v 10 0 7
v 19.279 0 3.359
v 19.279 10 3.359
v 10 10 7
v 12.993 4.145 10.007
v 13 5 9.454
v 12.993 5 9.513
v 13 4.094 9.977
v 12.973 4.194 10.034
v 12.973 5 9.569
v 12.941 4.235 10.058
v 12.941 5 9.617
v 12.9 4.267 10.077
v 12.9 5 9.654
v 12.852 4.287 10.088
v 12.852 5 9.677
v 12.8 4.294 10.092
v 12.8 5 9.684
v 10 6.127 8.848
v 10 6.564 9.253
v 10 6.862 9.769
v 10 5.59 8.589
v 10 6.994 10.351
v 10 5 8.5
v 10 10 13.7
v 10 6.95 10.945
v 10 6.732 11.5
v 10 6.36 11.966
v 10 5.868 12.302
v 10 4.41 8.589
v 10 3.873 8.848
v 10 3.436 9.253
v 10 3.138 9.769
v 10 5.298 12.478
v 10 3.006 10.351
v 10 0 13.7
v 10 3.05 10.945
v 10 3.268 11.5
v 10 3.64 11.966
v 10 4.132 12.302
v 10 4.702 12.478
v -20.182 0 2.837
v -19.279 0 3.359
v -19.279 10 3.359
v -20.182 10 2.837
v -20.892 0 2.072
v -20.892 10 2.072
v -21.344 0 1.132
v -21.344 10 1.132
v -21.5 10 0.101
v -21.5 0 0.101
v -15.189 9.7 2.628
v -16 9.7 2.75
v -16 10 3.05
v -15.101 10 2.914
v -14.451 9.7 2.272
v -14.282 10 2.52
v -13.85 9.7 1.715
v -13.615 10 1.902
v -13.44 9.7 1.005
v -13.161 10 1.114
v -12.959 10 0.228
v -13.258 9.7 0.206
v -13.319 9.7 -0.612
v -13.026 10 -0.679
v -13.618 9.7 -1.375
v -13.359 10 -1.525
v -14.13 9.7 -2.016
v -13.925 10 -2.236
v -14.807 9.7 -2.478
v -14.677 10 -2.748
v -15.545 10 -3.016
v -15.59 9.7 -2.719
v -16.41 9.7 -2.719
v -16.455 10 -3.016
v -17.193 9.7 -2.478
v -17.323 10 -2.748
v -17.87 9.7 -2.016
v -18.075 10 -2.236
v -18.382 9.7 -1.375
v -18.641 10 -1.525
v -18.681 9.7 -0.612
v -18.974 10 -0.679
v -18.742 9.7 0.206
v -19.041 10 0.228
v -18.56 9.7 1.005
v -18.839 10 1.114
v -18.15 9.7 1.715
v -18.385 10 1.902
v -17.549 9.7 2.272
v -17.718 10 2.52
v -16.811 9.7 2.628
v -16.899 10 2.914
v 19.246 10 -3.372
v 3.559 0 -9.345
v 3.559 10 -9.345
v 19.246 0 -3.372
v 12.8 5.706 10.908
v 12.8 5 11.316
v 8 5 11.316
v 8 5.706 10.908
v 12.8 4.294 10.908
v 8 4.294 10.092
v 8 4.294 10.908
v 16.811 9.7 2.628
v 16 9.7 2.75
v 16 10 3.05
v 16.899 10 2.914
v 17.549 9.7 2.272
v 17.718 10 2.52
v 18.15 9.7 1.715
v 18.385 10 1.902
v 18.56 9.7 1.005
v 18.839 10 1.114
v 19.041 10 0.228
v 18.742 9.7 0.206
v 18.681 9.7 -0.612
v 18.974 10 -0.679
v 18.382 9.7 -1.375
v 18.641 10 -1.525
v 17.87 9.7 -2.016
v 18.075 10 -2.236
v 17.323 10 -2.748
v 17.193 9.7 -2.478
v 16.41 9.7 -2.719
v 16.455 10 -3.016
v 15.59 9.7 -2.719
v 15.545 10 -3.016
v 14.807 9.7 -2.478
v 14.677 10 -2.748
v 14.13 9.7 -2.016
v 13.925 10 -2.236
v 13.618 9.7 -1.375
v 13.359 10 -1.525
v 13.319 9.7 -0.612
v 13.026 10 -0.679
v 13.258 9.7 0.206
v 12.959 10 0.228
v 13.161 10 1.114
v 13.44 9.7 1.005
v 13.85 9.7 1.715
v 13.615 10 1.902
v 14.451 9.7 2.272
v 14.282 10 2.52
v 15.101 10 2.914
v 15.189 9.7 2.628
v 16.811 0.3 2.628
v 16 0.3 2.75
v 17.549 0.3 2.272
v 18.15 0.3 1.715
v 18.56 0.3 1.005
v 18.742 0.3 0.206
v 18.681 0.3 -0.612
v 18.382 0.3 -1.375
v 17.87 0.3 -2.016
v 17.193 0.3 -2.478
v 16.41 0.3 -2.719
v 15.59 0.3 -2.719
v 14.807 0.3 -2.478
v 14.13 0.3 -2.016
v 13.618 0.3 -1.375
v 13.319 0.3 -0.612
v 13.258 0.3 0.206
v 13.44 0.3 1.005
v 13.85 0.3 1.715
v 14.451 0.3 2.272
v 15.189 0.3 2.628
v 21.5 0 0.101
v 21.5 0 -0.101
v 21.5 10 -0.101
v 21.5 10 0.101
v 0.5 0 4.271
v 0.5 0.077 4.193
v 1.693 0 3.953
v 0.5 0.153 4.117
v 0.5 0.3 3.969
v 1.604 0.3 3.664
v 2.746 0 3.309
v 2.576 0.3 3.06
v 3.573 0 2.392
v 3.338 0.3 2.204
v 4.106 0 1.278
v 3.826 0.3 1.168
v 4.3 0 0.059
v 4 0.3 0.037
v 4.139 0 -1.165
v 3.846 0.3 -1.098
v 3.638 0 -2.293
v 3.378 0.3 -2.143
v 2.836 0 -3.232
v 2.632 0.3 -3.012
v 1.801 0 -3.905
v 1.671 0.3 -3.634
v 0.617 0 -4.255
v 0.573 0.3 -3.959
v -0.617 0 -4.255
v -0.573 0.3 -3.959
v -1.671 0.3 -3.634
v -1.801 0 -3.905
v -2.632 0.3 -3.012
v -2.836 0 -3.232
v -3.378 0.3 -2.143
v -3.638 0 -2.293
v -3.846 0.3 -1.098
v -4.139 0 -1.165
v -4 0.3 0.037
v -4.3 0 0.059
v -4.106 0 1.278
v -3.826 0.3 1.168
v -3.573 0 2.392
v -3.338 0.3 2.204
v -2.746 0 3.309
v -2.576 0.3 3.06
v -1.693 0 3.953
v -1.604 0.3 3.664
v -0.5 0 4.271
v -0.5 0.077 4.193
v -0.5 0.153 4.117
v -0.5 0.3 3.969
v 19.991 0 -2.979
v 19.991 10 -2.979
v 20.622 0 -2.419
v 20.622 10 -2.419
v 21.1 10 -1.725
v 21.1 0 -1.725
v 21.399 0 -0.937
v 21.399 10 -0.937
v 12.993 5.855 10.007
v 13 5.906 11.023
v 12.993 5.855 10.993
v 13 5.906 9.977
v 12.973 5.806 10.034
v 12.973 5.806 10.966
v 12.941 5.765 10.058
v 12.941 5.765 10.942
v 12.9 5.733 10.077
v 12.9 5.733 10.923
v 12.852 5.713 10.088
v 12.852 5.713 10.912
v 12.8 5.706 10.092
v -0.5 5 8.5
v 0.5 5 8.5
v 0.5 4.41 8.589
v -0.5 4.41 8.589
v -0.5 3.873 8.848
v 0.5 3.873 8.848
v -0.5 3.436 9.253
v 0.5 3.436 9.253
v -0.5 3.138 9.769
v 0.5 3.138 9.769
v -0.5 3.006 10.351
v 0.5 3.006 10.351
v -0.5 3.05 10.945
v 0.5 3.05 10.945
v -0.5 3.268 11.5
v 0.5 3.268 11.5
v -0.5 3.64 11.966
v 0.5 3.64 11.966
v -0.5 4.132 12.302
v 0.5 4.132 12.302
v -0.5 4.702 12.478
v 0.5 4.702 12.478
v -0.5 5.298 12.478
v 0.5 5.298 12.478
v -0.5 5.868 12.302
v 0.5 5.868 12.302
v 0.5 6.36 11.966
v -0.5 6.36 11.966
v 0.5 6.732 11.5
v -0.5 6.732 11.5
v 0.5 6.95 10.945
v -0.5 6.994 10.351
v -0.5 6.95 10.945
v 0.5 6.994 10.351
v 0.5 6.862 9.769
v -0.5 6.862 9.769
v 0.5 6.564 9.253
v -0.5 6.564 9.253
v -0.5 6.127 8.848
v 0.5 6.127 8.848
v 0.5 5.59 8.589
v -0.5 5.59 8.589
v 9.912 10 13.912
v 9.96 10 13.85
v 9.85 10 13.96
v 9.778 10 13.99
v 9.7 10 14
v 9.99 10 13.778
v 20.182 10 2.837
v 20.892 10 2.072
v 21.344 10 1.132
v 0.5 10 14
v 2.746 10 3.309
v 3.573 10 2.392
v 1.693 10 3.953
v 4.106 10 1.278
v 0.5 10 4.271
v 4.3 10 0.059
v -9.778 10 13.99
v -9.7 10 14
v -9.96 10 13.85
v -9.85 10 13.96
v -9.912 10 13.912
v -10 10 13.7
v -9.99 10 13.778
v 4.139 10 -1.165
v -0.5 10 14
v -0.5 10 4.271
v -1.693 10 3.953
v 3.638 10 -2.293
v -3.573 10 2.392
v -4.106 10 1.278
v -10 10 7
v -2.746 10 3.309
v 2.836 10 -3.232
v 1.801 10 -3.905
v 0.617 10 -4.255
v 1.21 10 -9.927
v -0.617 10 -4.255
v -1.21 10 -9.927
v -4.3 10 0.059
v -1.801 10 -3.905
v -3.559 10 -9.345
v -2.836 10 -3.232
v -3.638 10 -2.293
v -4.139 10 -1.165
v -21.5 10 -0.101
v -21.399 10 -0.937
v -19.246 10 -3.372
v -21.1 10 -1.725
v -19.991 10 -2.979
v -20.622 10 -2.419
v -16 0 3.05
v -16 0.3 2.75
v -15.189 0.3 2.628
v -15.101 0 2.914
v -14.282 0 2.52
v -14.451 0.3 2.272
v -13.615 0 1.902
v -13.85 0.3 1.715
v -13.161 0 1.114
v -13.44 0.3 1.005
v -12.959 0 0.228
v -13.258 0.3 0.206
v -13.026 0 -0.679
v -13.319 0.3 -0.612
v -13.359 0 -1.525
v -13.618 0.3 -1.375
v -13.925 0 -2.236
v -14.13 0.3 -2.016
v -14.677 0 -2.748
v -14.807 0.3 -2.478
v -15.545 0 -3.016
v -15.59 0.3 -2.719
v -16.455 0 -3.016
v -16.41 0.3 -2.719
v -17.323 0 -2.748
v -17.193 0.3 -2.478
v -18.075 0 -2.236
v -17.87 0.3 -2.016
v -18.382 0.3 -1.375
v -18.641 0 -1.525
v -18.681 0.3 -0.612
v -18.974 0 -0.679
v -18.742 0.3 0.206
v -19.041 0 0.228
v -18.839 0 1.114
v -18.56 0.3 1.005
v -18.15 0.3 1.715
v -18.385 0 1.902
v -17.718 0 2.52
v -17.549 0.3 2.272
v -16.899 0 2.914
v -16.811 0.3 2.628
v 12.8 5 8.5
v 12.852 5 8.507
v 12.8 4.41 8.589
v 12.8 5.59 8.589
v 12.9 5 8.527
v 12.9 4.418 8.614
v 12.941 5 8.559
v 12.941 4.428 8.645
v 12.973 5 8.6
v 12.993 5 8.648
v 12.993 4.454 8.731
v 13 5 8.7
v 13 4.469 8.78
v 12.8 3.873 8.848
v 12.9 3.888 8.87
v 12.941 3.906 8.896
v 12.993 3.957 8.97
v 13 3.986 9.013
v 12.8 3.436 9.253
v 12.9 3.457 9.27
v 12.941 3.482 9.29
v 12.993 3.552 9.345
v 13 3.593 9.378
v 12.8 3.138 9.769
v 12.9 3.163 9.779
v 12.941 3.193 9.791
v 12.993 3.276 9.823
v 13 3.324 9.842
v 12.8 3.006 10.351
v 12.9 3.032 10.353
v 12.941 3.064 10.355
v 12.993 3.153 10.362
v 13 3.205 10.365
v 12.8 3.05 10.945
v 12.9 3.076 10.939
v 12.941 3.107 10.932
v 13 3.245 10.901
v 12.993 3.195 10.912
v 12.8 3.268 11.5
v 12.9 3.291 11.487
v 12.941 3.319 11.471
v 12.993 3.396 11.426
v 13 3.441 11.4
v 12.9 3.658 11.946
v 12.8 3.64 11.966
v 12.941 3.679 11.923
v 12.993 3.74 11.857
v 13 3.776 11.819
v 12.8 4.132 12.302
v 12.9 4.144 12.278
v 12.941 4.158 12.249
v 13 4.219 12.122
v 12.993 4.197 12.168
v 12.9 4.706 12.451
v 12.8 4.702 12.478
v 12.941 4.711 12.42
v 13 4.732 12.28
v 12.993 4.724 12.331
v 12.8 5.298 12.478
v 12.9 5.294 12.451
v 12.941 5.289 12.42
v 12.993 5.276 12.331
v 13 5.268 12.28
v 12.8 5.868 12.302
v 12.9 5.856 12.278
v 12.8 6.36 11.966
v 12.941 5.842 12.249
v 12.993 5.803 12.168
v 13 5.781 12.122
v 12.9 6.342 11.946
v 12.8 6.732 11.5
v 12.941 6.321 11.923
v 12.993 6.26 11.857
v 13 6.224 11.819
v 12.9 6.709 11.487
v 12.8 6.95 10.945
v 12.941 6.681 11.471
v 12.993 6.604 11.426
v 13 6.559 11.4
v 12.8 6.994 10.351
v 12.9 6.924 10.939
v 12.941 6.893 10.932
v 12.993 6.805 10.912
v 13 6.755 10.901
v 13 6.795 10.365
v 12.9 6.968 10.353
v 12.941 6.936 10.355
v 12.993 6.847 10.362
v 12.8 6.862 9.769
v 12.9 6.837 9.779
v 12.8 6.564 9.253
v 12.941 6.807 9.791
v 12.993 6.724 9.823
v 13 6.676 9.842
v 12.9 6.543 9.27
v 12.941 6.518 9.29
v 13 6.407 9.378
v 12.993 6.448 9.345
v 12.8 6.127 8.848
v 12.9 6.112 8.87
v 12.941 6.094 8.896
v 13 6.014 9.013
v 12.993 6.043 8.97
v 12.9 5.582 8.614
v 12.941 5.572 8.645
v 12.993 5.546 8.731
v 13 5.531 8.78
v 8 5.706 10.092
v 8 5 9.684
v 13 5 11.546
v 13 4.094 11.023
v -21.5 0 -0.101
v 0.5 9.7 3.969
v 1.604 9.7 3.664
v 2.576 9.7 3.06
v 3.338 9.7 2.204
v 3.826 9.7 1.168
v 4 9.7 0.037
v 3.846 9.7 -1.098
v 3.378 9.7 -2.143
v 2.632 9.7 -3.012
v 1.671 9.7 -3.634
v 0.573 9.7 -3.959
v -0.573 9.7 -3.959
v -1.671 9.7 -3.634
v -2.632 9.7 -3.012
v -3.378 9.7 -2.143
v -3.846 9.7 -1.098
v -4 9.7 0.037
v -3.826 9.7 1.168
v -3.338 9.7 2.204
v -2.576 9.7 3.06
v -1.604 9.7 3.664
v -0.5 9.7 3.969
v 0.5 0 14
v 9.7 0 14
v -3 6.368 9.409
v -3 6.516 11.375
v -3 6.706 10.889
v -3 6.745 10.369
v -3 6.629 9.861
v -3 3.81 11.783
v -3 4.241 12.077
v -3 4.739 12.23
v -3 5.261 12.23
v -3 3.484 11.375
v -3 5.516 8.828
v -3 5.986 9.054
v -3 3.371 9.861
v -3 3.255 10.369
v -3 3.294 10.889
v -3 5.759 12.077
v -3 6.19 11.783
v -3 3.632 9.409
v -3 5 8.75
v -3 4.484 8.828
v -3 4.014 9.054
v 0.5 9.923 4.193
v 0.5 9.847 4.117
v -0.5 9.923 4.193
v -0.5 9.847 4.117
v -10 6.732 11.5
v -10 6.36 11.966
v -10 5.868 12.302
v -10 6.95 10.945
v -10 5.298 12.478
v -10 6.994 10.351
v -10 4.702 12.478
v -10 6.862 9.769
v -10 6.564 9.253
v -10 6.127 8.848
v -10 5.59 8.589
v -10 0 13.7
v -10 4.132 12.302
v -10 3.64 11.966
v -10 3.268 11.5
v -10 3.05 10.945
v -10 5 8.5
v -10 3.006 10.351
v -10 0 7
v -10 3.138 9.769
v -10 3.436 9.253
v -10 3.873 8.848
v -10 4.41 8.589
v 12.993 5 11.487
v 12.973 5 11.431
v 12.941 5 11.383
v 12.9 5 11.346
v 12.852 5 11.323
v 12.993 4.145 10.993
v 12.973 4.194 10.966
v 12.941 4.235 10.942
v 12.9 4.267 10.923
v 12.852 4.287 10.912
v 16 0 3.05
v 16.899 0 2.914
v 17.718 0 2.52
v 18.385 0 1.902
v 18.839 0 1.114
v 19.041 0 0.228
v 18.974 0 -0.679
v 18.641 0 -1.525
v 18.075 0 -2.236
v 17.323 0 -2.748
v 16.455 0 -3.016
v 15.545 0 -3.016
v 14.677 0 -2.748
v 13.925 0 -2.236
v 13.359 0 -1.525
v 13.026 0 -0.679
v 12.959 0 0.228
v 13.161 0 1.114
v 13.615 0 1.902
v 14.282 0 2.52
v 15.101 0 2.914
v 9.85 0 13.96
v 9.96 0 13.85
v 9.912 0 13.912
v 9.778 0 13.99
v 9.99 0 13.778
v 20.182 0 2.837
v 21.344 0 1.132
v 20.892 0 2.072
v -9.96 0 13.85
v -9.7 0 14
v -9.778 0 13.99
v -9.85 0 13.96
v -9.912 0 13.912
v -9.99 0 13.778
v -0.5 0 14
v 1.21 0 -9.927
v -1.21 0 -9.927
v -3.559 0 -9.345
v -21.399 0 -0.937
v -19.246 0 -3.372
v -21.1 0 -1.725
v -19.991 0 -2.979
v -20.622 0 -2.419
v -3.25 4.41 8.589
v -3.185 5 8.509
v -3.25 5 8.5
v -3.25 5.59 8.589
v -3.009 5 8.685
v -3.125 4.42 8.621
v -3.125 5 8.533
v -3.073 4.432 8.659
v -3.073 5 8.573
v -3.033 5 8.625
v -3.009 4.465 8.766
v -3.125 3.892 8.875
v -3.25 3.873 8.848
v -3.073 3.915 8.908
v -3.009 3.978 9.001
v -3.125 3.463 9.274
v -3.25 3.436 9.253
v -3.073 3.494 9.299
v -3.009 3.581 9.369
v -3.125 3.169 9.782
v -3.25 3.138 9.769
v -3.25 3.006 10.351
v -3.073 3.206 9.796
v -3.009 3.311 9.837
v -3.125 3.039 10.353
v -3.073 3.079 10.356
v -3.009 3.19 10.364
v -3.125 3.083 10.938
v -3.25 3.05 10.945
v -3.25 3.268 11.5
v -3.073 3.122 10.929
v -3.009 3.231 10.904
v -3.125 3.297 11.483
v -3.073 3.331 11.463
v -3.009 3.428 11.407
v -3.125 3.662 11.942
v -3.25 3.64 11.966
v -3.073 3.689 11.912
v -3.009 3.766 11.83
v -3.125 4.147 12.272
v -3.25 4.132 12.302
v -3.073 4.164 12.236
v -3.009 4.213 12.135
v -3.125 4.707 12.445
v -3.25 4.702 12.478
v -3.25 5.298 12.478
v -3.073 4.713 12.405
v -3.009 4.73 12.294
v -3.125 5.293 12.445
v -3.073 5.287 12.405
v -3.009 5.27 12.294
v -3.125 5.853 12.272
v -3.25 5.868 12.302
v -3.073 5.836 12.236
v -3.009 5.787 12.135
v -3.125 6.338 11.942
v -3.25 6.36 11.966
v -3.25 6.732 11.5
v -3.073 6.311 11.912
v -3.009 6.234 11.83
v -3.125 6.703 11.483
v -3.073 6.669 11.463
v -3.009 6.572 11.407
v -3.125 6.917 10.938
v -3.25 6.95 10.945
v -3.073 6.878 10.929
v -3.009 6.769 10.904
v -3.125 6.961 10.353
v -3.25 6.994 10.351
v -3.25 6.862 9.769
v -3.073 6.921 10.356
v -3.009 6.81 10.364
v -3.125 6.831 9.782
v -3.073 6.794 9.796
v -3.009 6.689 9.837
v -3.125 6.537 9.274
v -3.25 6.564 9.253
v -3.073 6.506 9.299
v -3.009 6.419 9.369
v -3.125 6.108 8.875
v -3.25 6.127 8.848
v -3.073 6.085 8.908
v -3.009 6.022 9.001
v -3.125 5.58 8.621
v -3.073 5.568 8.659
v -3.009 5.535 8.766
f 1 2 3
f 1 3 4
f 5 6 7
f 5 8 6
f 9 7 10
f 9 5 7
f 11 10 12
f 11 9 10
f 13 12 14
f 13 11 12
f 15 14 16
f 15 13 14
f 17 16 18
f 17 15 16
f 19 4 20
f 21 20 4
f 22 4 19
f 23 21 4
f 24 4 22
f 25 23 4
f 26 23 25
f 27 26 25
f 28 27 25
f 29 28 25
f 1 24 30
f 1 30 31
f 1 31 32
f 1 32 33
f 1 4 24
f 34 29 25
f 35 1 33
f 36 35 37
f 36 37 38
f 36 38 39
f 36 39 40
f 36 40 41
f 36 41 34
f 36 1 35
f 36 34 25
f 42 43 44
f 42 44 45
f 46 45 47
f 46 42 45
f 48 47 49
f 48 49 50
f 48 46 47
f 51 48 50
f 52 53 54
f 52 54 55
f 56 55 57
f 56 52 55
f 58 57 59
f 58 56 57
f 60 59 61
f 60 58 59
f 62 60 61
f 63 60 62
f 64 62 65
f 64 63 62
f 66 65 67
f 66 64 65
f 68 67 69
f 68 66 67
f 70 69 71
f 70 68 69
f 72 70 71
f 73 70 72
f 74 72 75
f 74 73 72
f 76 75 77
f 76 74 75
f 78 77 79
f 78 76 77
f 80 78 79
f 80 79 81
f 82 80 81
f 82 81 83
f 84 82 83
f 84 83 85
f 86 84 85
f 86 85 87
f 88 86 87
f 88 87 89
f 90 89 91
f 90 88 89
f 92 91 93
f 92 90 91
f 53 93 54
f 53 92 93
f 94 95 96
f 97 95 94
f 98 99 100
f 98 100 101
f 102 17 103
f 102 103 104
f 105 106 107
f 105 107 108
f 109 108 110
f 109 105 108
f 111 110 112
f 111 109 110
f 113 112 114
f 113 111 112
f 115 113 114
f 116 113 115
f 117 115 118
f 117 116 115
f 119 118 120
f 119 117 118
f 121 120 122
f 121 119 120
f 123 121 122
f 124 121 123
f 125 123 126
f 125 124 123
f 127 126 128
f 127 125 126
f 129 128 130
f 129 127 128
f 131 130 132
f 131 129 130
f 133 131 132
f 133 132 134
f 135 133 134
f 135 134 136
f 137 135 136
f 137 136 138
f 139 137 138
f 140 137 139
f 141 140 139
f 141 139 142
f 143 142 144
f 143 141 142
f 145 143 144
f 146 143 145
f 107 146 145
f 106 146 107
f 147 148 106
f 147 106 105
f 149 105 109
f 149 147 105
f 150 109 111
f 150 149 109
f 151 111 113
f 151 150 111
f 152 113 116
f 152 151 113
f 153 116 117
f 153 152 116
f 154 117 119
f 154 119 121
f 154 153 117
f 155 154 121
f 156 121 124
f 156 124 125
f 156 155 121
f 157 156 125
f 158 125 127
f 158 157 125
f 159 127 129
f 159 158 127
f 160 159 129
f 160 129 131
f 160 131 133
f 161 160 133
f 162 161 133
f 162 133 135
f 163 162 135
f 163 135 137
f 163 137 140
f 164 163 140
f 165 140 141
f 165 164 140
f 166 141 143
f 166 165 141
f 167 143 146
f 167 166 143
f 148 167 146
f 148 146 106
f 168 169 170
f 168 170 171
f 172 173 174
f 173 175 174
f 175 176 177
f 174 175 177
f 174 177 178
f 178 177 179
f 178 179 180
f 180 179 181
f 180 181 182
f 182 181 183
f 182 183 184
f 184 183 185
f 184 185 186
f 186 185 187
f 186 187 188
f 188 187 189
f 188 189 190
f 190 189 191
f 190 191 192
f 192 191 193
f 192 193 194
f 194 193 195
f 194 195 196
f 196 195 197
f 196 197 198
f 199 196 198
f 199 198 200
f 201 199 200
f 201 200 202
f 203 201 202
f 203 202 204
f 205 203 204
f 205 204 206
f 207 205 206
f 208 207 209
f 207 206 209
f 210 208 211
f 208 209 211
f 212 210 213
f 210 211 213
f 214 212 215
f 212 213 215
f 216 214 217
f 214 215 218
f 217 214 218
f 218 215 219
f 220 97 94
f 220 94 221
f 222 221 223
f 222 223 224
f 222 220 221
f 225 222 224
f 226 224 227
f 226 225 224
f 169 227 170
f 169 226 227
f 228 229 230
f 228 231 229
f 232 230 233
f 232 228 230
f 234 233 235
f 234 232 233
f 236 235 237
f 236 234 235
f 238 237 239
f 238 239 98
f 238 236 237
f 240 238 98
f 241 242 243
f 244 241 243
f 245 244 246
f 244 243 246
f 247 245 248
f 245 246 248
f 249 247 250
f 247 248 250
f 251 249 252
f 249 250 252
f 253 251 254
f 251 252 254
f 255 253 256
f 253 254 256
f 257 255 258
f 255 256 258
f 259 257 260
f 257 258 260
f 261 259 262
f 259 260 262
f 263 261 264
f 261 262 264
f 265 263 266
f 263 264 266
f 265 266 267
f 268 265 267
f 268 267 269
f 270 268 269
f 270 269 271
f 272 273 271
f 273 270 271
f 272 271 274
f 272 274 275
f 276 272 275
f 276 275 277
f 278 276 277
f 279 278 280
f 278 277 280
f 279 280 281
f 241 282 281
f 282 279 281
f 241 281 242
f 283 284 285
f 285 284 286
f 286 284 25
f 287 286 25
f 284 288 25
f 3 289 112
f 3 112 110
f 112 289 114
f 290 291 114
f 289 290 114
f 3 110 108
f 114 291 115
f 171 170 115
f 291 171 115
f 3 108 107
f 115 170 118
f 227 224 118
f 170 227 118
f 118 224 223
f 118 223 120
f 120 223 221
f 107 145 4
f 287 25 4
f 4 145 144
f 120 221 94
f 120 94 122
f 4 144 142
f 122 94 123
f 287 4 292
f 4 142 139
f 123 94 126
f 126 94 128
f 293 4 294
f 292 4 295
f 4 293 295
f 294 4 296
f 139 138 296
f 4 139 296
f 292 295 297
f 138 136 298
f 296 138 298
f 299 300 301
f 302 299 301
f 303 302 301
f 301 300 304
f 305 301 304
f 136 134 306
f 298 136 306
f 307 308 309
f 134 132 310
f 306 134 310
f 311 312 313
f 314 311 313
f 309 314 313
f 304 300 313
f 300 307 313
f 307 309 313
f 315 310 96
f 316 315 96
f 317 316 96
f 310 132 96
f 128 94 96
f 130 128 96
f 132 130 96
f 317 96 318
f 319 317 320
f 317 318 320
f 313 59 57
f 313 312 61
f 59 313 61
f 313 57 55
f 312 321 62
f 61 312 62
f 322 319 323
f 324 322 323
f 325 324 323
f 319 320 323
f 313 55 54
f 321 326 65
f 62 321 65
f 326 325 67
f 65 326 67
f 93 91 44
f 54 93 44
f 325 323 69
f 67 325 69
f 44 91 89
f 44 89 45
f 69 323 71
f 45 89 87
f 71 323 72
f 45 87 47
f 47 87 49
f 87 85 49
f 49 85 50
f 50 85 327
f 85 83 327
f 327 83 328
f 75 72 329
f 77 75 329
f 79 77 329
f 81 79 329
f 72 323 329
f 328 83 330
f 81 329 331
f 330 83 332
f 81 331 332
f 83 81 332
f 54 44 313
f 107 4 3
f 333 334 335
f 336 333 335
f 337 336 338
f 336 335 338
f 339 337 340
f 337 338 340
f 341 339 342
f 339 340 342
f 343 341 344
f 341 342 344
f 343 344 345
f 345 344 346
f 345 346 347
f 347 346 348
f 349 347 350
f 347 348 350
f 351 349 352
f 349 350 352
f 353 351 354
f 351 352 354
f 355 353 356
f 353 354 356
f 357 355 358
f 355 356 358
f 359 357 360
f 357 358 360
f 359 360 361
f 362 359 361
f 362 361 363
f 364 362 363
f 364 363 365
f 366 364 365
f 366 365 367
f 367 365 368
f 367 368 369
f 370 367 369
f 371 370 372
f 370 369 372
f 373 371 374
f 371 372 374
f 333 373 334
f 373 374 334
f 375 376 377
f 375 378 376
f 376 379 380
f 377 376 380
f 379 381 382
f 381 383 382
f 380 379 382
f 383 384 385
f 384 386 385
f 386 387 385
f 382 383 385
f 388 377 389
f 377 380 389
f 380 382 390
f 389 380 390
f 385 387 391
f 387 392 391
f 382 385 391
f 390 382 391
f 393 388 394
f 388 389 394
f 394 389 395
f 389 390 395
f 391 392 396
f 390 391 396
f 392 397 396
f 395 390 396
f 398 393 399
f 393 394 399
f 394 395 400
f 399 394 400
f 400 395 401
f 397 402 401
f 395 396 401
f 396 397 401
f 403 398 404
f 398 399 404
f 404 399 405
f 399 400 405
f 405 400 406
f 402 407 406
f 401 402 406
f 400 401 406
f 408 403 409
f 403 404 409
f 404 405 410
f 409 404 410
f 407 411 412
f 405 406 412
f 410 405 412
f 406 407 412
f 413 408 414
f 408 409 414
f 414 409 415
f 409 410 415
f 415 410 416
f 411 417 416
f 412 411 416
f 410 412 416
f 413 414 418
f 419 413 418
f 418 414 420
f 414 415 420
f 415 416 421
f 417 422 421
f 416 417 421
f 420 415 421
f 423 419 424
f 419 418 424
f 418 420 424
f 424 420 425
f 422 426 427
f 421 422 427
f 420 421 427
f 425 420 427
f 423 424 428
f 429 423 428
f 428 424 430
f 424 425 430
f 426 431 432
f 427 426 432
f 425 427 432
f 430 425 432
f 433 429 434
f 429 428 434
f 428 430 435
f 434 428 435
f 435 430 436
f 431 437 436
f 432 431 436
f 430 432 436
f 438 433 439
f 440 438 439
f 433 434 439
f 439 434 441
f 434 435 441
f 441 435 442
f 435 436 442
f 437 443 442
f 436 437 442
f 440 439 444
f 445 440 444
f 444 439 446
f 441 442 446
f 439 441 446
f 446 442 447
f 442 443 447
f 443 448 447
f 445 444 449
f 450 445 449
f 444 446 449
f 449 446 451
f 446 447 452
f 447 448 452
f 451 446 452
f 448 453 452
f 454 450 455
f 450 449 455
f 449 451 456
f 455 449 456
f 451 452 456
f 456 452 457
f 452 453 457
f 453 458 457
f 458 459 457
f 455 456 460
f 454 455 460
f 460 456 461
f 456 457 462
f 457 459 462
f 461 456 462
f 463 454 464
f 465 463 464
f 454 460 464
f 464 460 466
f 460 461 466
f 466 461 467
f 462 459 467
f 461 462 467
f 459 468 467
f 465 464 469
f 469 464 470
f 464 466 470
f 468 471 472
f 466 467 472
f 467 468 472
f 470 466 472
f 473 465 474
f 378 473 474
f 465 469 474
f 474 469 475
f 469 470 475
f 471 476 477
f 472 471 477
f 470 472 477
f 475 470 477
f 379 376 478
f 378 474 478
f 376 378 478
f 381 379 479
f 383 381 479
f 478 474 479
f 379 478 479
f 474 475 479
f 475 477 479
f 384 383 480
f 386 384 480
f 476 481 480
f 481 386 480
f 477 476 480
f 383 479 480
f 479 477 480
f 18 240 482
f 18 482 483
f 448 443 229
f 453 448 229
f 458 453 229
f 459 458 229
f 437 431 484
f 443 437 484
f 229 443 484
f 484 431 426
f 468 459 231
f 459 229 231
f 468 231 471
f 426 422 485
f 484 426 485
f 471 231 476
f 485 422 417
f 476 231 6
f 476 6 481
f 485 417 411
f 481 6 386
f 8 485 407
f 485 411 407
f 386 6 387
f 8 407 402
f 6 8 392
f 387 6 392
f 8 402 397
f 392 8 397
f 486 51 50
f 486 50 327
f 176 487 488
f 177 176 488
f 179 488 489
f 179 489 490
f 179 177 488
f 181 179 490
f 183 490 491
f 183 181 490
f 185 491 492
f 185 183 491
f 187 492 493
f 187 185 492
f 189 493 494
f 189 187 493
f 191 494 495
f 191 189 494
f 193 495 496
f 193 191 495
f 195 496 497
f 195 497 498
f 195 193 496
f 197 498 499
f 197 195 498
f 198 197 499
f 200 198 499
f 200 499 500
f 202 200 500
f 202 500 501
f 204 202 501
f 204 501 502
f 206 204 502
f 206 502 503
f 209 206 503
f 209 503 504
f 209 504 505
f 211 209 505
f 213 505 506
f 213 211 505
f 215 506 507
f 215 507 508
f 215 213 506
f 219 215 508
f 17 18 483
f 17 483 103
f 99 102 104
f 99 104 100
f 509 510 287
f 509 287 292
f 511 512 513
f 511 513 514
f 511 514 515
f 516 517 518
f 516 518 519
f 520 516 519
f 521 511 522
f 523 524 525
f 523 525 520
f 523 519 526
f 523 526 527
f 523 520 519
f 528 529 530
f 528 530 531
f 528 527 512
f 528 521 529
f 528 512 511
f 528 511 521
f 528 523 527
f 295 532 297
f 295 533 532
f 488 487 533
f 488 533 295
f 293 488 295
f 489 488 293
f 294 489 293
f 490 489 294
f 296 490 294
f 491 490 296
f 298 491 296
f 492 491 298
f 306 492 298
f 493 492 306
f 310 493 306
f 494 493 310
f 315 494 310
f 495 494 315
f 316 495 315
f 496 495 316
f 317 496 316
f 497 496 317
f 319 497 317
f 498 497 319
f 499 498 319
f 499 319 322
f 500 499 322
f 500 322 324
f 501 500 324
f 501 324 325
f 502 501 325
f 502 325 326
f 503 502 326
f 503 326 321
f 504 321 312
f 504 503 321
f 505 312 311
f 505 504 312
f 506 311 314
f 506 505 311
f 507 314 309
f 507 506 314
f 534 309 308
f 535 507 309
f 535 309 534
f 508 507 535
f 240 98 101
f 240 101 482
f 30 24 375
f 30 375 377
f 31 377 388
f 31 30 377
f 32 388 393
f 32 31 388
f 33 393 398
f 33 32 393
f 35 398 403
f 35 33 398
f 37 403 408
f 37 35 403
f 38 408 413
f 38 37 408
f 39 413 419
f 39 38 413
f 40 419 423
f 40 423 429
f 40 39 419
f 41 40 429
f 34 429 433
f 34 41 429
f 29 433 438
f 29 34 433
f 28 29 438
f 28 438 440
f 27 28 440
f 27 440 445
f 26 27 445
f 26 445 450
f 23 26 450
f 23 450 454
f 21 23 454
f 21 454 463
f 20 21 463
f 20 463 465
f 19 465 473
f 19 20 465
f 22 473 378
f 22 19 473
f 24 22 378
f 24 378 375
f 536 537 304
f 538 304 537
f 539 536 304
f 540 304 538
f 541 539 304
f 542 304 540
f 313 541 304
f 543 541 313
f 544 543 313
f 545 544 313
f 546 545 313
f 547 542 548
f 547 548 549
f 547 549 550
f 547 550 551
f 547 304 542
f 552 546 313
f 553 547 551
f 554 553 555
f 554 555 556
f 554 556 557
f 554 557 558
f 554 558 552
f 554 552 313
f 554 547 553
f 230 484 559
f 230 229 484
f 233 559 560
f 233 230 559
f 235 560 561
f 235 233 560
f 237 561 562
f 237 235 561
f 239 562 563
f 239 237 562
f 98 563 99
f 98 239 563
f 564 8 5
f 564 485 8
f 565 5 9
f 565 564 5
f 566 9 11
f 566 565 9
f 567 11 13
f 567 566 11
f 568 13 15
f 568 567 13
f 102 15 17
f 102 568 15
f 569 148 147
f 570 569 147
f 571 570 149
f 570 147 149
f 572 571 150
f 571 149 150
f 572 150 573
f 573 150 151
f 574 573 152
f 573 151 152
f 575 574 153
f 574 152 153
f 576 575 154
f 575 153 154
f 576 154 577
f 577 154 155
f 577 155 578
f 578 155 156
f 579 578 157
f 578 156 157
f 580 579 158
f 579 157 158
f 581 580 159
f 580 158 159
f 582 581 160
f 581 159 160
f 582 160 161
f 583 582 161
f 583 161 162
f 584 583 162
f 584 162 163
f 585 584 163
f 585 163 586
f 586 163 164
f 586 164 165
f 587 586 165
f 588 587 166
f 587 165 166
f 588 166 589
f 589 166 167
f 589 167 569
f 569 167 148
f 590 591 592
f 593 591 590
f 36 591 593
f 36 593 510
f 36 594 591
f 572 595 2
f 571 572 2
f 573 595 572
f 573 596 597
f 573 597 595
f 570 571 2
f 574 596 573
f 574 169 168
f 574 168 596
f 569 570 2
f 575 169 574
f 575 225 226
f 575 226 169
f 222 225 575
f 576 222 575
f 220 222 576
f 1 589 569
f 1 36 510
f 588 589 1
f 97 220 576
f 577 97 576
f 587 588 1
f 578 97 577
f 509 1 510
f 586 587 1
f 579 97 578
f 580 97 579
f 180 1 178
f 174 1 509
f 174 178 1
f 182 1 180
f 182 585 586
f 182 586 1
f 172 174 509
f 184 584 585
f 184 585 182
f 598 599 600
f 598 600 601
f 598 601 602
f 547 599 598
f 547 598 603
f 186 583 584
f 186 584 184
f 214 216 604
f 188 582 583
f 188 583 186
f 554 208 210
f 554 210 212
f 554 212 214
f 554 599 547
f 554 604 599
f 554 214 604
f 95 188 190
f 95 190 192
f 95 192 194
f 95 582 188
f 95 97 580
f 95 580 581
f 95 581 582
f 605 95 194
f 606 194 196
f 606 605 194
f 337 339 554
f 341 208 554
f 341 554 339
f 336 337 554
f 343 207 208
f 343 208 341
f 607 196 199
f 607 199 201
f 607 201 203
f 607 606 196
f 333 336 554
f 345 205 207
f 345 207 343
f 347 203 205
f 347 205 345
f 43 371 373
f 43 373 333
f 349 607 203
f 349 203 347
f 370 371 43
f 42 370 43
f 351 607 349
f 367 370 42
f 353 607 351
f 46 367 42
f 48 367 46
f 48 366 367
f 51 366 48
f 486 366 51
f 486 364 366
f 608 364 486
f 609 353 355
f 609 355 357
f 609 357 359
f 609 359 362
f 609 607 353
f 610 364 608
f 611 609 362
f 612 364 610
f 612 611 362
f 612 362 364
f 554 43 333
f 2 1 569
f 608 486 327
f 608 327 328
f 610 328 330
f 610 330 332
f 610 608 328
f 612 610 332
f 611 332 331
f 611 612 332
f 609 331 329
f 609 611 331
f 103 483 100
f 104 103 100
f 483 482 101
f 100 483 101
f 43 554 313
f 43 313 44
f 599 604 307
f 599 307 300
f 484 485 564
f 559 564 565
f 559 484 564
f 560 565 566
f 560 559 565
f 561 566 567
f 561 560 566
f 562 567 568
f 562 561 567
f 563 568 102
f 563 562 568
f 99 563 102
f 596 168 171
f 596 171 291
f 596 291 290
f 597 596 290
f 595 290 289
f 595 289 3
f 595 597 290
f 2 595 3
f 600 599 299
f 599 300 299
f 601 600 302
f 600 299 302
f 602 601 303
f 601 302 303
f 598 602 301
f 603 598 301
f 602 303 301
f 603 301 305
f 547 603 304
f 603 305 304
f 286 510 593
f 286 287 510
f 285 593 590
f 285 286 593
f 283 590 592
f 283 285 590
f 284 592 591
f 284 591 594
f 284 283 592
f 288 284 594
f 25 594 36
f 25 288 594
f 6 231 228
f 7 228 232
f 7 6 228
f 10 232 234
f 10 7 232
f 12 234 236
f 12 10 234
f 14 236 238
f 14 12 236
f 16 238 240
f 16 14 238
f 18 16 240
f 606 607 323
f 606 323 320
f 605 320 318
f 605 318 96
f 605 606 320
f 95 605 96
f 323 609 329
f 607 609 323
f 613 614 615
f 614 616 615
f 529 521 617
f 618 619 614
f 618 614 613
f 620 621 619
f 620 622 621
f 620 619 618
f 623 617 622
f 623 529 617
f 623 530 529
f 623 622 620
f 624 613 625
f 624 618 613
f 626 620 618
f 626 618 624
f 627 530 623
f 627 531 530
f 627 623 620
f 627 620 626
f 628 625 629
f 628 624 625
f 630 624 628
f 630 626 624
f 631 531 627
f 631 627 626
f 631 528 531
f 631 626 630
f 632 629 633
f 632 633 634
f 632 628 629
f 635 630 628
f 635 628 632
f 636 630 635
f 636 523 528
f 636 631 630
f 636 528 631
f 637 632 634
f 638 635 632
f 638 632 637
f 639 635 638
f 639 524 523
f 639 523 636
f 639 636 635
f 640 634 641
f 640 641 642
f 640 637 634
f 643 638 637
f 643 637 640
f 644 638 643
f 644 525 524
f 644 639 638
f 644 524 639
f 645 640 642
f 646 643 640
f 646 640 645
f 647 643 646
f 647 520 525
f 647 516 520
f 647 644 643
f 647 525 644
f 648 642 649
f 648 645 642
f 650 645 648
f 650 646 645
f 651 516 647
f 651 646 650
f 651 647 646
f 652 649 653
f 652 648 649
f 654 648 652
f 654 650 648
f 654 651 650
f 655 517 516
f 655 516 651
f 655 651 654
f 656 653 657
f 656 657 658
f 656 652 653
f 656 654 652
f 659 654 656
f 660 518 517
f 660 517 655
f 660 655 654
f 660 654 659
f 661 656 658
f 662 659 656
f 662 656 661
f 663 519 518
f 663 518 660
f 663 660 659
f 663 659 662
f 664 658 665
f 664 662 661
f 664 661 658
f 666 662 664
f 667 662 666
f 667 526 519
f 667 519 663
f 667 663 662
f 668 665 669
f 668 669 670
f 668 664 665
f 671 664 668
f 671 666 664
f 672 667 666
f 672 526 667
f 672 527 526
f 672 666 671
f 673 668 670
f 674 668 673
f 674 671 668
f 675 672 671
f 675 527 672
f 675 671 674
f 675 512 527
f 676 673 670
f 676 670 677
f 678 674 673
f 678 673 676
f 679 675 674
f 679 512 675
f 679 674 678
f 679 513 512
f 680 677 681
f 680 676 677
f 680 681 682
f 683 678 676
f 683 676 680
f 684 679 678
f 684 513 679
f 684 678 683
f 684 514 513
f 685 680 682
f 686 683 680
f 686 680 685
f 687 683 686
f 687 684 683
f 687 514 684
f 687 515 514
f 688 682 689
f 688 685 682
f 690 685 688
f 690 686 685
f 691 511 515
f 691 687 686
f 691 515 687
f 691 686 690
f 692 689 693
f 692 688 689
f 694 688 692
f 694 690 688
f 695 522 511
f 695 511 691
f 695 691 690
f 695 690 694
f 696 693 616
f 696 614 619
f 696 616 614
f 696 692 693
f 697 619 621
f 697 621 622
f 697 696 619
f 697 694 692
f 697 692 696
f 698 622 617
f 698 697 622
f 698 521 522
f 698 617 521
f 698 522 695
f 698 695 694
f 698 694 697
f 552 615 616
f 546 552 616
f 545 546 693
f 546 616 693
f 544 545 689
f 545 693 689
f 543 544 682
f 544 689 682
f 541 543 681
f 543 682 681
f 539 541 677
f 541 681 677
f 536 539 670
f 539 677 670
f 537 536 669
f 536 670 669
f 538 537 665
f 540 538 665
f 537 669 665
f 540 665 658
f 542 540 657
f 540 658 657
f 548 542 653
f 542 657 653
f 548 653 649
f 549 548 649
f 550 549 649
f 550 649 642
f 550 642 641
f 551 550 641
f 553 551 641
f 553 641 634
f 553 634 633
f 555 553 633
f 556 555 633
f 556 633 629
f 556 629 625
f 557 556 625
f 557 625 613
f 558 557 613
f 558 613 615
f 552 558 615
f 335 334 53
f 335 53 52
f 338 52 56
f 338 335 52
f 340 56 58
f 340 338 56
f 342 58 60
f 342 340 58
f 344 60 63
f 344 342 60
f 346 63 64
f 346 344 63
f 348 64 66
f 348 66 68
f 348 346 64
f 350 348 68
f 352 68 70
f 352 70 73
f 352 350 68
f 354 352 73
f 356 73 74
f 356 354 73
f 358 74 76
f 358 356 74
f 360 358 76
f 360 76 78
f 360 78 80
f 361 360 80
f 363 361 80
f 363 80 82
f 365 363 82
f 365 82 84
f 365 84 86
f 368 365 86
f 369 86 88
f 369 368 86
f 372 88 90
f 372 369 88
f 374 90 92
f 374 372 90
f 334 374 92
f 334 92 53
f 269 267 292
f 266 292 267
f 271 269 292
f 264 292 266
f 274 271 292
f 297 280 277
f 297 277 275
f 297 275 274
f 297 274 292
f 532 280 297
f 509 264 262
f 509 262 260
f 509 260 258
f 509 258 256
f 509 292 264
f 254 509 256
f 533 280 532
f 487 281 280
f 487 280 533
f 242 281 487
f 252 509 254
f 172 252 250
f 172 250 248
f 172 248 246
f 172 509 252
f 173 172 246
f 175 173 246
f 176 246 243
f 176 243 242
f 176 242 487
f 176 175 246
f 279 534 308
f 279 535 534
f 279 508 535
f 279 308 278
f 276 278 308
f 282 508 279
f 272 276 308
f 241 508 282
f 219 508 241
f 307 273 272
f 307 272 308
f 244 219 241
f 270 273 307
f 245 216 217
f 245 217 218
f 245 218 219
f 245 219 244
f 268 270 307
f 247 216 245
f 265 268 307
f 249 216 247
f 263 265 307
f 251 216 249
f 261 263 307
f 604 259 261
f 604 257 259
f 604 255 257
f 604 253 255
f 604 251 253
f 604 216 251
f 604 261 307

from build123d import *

# Parameters (mm, degrees)
SKETCH1_R                     = 2.75
BOSS_EXTRUDE1_DEPTH           = 10
SKETCH3_R                     = 2
CUT_EXTRUDE1_DEPTH            = 32.5
ESBO_O1_R                     = 2
RESSALTO_EXTRUS_O2_DEPTH      = 13
RESSALTO_EXTRUS_O2_DEPTH_BACK = 3
CORTE_EXTRUS_O1_DEPTH         = 5
FILETE1_R                     = 0.2
FILETE2_R                     = 0.25
CHAMFER_1_SIZE                = 0.3
FILLET_1_R                    = 0.3


with BuildPart() as part:
    # Sketch1 → Boss-Extrude1 (new body)
    with BuildSketch(Plane(origin=(0, 0, 0), x_dir=(1, 0, 0), z_dir=(0, 1, 0))):
        with BuildLine():
            Line((21.5, 0.100660355), (21.5, -0.100660355))
            ThreePointArc((21.5, -0.100660355), (20.891804651, -2.072326113), (19.278590937, -3.35875876))
            Line((19.278590937, -3.35875876), (10, -7))
            Line((10, -7), (10, -14))
            Line((10, -14), (0.5, -14))
            Line((0.5, -14), (0.5, -3.968626967))
            ThreePointArc((0.5, -3.968626967), (0, 4), (-0.5, -3.968626967))
            Line((-0.5, -3.968626967), (-0.5, -14))
            Line((-0.5, -14), (-10, -14))
            Line((-10, -14), (-10, -7))
            Line((-10, -7), (-19.278590937, -3.35875876))
            ThreePointArc((-19.278590937, -3.35875876), (-20.891804651, -2.072326113), (-21.5, -0.100660355))
            Line((-21.5, -0.100660355), (-21.5, 0.100660355))
            ThreePointArc((-21.5, 0.100660355), (-20.881804225, 2.086914218), (-19.245597481, 3.371514512))
            Line((-19.245597481, 3.371514512), (-3.558849946, 9.345297591))
            ThreePointArc((-3.558849946, 9.345297591), (0, 10), (3.558849946, 9.345297591))
            Line((3.558849946, 9.345297591), (19.245597481, 3.371514512))
            ThreePointArc((19.245597481, 3.371514512), (20.881804225, 2.086914218), (21.5, 0.100660355))
        make_face()
        with Locations(Location((-16, 0, 0), (0, 0, 270))):  # turned: the seam where the file's is
            Circle(SKETCH1_R, mode=Mode.SUBTRACT)
        with Locations(Location((16, 0, 0), (0, 0, 270))):  # turned: the seam where the file's is
            Circle(SKETCH1_R, mode=Mode.SUBTRACT)
    extrude(amount=BOSS_EXTRUDE1_DEPTH)

    # Sketch3 → Cut-Extrude1 (cut, through all)
    with BuildSketch(Plane(origin=(10, 0, 0), x_dir=(0, 0, -1), z_dir=(1, 0, 0))):
        with Locations((-10.5, 5)):
            Circle(SKETCH3_R)
    extrude(amount=-CUT_EXTRUDE1_DEPTH, mode=Mode.SUBTRACT)

    # Esboço1 → Ressalto-extrusão2 (add, two sides)
    with BuildSketch(Plane.ZY.offset(-10)) as ressalto_extrus_o2_sk:
        with Locations(Location((10.5, 5, 0), (0, 0, 180))):  # turned: the seam where the file's is
            Circle(ESBO_O1_R)
    extrude(amount=RESSALTO_EXTRUS_O2_DEPTH)
    extrude(ressalto_extrus_o2_sk.sketch, amount=-RESSALTO_EXTRUS_O2_DEPTH_BACK)

    # Esboço2 → Corte-extrusão1 (cut)
    with BuildSketch(Plane.ZY.offset(-13)):
        Polygon((10.90776936, 4.293722751), (11.315538719, 5), (10.90776936, 5.706277249), (10.09223064, 5.706277249), (9.684461281, 5), (10.09223064, 4.293722751), align=None)
    extrude(amount=CORTE_EXTRUS_O1_DEPTH, mode=Mode.SUBTRACT)

    # Filete1
    filete1_edges = [part.edges().sort_by_distance(p)[0] for p in [
        (13, 5, 12.5),
        (13, 4.646861376, 11.11165404),
        (13, 4.293722751, 10.5),
        (13, 4.646861376, 9.88834596),
        (13, 5.353138624, 9.88834596),
        (13, 5.706277249, 10.5),
        (13, 5.353138624, 11.11165404),
    ]]
    fillet(filete1_edges, radius=FILETE1_R)

    # Filete2
    filete2_edges = [part.edges().sort_by_distance(p)[0] for p in [
        (-3, 5, 12.5),
    ]]
    fillet(filete2_edges, radius=FILETE2_R)

    # Фаска1
    chamfer_1_edges = [part.edges().sort_by_distance(p)[0] for p in [
        (0, 0, -4),
        (-16, 0, -2.75),
        (0, 10, -4),
        (-16, 10, -2.75),
        (16, 0, -2.75),
        (16, 10, -2.75),
    ]]
    chamfer(chamfer_1_edges, length=CHAMFER_1_SIZE)

    # Скругление1
    fillet_1_edges = [part.edges().sort_by_distance(p)[0] for p in [
        (10, 5, 14),
        (-10, 5, 14),
    ]]
    fillet(fillet_1_edges, radius=FILLET_1_R)


solid = part.part
